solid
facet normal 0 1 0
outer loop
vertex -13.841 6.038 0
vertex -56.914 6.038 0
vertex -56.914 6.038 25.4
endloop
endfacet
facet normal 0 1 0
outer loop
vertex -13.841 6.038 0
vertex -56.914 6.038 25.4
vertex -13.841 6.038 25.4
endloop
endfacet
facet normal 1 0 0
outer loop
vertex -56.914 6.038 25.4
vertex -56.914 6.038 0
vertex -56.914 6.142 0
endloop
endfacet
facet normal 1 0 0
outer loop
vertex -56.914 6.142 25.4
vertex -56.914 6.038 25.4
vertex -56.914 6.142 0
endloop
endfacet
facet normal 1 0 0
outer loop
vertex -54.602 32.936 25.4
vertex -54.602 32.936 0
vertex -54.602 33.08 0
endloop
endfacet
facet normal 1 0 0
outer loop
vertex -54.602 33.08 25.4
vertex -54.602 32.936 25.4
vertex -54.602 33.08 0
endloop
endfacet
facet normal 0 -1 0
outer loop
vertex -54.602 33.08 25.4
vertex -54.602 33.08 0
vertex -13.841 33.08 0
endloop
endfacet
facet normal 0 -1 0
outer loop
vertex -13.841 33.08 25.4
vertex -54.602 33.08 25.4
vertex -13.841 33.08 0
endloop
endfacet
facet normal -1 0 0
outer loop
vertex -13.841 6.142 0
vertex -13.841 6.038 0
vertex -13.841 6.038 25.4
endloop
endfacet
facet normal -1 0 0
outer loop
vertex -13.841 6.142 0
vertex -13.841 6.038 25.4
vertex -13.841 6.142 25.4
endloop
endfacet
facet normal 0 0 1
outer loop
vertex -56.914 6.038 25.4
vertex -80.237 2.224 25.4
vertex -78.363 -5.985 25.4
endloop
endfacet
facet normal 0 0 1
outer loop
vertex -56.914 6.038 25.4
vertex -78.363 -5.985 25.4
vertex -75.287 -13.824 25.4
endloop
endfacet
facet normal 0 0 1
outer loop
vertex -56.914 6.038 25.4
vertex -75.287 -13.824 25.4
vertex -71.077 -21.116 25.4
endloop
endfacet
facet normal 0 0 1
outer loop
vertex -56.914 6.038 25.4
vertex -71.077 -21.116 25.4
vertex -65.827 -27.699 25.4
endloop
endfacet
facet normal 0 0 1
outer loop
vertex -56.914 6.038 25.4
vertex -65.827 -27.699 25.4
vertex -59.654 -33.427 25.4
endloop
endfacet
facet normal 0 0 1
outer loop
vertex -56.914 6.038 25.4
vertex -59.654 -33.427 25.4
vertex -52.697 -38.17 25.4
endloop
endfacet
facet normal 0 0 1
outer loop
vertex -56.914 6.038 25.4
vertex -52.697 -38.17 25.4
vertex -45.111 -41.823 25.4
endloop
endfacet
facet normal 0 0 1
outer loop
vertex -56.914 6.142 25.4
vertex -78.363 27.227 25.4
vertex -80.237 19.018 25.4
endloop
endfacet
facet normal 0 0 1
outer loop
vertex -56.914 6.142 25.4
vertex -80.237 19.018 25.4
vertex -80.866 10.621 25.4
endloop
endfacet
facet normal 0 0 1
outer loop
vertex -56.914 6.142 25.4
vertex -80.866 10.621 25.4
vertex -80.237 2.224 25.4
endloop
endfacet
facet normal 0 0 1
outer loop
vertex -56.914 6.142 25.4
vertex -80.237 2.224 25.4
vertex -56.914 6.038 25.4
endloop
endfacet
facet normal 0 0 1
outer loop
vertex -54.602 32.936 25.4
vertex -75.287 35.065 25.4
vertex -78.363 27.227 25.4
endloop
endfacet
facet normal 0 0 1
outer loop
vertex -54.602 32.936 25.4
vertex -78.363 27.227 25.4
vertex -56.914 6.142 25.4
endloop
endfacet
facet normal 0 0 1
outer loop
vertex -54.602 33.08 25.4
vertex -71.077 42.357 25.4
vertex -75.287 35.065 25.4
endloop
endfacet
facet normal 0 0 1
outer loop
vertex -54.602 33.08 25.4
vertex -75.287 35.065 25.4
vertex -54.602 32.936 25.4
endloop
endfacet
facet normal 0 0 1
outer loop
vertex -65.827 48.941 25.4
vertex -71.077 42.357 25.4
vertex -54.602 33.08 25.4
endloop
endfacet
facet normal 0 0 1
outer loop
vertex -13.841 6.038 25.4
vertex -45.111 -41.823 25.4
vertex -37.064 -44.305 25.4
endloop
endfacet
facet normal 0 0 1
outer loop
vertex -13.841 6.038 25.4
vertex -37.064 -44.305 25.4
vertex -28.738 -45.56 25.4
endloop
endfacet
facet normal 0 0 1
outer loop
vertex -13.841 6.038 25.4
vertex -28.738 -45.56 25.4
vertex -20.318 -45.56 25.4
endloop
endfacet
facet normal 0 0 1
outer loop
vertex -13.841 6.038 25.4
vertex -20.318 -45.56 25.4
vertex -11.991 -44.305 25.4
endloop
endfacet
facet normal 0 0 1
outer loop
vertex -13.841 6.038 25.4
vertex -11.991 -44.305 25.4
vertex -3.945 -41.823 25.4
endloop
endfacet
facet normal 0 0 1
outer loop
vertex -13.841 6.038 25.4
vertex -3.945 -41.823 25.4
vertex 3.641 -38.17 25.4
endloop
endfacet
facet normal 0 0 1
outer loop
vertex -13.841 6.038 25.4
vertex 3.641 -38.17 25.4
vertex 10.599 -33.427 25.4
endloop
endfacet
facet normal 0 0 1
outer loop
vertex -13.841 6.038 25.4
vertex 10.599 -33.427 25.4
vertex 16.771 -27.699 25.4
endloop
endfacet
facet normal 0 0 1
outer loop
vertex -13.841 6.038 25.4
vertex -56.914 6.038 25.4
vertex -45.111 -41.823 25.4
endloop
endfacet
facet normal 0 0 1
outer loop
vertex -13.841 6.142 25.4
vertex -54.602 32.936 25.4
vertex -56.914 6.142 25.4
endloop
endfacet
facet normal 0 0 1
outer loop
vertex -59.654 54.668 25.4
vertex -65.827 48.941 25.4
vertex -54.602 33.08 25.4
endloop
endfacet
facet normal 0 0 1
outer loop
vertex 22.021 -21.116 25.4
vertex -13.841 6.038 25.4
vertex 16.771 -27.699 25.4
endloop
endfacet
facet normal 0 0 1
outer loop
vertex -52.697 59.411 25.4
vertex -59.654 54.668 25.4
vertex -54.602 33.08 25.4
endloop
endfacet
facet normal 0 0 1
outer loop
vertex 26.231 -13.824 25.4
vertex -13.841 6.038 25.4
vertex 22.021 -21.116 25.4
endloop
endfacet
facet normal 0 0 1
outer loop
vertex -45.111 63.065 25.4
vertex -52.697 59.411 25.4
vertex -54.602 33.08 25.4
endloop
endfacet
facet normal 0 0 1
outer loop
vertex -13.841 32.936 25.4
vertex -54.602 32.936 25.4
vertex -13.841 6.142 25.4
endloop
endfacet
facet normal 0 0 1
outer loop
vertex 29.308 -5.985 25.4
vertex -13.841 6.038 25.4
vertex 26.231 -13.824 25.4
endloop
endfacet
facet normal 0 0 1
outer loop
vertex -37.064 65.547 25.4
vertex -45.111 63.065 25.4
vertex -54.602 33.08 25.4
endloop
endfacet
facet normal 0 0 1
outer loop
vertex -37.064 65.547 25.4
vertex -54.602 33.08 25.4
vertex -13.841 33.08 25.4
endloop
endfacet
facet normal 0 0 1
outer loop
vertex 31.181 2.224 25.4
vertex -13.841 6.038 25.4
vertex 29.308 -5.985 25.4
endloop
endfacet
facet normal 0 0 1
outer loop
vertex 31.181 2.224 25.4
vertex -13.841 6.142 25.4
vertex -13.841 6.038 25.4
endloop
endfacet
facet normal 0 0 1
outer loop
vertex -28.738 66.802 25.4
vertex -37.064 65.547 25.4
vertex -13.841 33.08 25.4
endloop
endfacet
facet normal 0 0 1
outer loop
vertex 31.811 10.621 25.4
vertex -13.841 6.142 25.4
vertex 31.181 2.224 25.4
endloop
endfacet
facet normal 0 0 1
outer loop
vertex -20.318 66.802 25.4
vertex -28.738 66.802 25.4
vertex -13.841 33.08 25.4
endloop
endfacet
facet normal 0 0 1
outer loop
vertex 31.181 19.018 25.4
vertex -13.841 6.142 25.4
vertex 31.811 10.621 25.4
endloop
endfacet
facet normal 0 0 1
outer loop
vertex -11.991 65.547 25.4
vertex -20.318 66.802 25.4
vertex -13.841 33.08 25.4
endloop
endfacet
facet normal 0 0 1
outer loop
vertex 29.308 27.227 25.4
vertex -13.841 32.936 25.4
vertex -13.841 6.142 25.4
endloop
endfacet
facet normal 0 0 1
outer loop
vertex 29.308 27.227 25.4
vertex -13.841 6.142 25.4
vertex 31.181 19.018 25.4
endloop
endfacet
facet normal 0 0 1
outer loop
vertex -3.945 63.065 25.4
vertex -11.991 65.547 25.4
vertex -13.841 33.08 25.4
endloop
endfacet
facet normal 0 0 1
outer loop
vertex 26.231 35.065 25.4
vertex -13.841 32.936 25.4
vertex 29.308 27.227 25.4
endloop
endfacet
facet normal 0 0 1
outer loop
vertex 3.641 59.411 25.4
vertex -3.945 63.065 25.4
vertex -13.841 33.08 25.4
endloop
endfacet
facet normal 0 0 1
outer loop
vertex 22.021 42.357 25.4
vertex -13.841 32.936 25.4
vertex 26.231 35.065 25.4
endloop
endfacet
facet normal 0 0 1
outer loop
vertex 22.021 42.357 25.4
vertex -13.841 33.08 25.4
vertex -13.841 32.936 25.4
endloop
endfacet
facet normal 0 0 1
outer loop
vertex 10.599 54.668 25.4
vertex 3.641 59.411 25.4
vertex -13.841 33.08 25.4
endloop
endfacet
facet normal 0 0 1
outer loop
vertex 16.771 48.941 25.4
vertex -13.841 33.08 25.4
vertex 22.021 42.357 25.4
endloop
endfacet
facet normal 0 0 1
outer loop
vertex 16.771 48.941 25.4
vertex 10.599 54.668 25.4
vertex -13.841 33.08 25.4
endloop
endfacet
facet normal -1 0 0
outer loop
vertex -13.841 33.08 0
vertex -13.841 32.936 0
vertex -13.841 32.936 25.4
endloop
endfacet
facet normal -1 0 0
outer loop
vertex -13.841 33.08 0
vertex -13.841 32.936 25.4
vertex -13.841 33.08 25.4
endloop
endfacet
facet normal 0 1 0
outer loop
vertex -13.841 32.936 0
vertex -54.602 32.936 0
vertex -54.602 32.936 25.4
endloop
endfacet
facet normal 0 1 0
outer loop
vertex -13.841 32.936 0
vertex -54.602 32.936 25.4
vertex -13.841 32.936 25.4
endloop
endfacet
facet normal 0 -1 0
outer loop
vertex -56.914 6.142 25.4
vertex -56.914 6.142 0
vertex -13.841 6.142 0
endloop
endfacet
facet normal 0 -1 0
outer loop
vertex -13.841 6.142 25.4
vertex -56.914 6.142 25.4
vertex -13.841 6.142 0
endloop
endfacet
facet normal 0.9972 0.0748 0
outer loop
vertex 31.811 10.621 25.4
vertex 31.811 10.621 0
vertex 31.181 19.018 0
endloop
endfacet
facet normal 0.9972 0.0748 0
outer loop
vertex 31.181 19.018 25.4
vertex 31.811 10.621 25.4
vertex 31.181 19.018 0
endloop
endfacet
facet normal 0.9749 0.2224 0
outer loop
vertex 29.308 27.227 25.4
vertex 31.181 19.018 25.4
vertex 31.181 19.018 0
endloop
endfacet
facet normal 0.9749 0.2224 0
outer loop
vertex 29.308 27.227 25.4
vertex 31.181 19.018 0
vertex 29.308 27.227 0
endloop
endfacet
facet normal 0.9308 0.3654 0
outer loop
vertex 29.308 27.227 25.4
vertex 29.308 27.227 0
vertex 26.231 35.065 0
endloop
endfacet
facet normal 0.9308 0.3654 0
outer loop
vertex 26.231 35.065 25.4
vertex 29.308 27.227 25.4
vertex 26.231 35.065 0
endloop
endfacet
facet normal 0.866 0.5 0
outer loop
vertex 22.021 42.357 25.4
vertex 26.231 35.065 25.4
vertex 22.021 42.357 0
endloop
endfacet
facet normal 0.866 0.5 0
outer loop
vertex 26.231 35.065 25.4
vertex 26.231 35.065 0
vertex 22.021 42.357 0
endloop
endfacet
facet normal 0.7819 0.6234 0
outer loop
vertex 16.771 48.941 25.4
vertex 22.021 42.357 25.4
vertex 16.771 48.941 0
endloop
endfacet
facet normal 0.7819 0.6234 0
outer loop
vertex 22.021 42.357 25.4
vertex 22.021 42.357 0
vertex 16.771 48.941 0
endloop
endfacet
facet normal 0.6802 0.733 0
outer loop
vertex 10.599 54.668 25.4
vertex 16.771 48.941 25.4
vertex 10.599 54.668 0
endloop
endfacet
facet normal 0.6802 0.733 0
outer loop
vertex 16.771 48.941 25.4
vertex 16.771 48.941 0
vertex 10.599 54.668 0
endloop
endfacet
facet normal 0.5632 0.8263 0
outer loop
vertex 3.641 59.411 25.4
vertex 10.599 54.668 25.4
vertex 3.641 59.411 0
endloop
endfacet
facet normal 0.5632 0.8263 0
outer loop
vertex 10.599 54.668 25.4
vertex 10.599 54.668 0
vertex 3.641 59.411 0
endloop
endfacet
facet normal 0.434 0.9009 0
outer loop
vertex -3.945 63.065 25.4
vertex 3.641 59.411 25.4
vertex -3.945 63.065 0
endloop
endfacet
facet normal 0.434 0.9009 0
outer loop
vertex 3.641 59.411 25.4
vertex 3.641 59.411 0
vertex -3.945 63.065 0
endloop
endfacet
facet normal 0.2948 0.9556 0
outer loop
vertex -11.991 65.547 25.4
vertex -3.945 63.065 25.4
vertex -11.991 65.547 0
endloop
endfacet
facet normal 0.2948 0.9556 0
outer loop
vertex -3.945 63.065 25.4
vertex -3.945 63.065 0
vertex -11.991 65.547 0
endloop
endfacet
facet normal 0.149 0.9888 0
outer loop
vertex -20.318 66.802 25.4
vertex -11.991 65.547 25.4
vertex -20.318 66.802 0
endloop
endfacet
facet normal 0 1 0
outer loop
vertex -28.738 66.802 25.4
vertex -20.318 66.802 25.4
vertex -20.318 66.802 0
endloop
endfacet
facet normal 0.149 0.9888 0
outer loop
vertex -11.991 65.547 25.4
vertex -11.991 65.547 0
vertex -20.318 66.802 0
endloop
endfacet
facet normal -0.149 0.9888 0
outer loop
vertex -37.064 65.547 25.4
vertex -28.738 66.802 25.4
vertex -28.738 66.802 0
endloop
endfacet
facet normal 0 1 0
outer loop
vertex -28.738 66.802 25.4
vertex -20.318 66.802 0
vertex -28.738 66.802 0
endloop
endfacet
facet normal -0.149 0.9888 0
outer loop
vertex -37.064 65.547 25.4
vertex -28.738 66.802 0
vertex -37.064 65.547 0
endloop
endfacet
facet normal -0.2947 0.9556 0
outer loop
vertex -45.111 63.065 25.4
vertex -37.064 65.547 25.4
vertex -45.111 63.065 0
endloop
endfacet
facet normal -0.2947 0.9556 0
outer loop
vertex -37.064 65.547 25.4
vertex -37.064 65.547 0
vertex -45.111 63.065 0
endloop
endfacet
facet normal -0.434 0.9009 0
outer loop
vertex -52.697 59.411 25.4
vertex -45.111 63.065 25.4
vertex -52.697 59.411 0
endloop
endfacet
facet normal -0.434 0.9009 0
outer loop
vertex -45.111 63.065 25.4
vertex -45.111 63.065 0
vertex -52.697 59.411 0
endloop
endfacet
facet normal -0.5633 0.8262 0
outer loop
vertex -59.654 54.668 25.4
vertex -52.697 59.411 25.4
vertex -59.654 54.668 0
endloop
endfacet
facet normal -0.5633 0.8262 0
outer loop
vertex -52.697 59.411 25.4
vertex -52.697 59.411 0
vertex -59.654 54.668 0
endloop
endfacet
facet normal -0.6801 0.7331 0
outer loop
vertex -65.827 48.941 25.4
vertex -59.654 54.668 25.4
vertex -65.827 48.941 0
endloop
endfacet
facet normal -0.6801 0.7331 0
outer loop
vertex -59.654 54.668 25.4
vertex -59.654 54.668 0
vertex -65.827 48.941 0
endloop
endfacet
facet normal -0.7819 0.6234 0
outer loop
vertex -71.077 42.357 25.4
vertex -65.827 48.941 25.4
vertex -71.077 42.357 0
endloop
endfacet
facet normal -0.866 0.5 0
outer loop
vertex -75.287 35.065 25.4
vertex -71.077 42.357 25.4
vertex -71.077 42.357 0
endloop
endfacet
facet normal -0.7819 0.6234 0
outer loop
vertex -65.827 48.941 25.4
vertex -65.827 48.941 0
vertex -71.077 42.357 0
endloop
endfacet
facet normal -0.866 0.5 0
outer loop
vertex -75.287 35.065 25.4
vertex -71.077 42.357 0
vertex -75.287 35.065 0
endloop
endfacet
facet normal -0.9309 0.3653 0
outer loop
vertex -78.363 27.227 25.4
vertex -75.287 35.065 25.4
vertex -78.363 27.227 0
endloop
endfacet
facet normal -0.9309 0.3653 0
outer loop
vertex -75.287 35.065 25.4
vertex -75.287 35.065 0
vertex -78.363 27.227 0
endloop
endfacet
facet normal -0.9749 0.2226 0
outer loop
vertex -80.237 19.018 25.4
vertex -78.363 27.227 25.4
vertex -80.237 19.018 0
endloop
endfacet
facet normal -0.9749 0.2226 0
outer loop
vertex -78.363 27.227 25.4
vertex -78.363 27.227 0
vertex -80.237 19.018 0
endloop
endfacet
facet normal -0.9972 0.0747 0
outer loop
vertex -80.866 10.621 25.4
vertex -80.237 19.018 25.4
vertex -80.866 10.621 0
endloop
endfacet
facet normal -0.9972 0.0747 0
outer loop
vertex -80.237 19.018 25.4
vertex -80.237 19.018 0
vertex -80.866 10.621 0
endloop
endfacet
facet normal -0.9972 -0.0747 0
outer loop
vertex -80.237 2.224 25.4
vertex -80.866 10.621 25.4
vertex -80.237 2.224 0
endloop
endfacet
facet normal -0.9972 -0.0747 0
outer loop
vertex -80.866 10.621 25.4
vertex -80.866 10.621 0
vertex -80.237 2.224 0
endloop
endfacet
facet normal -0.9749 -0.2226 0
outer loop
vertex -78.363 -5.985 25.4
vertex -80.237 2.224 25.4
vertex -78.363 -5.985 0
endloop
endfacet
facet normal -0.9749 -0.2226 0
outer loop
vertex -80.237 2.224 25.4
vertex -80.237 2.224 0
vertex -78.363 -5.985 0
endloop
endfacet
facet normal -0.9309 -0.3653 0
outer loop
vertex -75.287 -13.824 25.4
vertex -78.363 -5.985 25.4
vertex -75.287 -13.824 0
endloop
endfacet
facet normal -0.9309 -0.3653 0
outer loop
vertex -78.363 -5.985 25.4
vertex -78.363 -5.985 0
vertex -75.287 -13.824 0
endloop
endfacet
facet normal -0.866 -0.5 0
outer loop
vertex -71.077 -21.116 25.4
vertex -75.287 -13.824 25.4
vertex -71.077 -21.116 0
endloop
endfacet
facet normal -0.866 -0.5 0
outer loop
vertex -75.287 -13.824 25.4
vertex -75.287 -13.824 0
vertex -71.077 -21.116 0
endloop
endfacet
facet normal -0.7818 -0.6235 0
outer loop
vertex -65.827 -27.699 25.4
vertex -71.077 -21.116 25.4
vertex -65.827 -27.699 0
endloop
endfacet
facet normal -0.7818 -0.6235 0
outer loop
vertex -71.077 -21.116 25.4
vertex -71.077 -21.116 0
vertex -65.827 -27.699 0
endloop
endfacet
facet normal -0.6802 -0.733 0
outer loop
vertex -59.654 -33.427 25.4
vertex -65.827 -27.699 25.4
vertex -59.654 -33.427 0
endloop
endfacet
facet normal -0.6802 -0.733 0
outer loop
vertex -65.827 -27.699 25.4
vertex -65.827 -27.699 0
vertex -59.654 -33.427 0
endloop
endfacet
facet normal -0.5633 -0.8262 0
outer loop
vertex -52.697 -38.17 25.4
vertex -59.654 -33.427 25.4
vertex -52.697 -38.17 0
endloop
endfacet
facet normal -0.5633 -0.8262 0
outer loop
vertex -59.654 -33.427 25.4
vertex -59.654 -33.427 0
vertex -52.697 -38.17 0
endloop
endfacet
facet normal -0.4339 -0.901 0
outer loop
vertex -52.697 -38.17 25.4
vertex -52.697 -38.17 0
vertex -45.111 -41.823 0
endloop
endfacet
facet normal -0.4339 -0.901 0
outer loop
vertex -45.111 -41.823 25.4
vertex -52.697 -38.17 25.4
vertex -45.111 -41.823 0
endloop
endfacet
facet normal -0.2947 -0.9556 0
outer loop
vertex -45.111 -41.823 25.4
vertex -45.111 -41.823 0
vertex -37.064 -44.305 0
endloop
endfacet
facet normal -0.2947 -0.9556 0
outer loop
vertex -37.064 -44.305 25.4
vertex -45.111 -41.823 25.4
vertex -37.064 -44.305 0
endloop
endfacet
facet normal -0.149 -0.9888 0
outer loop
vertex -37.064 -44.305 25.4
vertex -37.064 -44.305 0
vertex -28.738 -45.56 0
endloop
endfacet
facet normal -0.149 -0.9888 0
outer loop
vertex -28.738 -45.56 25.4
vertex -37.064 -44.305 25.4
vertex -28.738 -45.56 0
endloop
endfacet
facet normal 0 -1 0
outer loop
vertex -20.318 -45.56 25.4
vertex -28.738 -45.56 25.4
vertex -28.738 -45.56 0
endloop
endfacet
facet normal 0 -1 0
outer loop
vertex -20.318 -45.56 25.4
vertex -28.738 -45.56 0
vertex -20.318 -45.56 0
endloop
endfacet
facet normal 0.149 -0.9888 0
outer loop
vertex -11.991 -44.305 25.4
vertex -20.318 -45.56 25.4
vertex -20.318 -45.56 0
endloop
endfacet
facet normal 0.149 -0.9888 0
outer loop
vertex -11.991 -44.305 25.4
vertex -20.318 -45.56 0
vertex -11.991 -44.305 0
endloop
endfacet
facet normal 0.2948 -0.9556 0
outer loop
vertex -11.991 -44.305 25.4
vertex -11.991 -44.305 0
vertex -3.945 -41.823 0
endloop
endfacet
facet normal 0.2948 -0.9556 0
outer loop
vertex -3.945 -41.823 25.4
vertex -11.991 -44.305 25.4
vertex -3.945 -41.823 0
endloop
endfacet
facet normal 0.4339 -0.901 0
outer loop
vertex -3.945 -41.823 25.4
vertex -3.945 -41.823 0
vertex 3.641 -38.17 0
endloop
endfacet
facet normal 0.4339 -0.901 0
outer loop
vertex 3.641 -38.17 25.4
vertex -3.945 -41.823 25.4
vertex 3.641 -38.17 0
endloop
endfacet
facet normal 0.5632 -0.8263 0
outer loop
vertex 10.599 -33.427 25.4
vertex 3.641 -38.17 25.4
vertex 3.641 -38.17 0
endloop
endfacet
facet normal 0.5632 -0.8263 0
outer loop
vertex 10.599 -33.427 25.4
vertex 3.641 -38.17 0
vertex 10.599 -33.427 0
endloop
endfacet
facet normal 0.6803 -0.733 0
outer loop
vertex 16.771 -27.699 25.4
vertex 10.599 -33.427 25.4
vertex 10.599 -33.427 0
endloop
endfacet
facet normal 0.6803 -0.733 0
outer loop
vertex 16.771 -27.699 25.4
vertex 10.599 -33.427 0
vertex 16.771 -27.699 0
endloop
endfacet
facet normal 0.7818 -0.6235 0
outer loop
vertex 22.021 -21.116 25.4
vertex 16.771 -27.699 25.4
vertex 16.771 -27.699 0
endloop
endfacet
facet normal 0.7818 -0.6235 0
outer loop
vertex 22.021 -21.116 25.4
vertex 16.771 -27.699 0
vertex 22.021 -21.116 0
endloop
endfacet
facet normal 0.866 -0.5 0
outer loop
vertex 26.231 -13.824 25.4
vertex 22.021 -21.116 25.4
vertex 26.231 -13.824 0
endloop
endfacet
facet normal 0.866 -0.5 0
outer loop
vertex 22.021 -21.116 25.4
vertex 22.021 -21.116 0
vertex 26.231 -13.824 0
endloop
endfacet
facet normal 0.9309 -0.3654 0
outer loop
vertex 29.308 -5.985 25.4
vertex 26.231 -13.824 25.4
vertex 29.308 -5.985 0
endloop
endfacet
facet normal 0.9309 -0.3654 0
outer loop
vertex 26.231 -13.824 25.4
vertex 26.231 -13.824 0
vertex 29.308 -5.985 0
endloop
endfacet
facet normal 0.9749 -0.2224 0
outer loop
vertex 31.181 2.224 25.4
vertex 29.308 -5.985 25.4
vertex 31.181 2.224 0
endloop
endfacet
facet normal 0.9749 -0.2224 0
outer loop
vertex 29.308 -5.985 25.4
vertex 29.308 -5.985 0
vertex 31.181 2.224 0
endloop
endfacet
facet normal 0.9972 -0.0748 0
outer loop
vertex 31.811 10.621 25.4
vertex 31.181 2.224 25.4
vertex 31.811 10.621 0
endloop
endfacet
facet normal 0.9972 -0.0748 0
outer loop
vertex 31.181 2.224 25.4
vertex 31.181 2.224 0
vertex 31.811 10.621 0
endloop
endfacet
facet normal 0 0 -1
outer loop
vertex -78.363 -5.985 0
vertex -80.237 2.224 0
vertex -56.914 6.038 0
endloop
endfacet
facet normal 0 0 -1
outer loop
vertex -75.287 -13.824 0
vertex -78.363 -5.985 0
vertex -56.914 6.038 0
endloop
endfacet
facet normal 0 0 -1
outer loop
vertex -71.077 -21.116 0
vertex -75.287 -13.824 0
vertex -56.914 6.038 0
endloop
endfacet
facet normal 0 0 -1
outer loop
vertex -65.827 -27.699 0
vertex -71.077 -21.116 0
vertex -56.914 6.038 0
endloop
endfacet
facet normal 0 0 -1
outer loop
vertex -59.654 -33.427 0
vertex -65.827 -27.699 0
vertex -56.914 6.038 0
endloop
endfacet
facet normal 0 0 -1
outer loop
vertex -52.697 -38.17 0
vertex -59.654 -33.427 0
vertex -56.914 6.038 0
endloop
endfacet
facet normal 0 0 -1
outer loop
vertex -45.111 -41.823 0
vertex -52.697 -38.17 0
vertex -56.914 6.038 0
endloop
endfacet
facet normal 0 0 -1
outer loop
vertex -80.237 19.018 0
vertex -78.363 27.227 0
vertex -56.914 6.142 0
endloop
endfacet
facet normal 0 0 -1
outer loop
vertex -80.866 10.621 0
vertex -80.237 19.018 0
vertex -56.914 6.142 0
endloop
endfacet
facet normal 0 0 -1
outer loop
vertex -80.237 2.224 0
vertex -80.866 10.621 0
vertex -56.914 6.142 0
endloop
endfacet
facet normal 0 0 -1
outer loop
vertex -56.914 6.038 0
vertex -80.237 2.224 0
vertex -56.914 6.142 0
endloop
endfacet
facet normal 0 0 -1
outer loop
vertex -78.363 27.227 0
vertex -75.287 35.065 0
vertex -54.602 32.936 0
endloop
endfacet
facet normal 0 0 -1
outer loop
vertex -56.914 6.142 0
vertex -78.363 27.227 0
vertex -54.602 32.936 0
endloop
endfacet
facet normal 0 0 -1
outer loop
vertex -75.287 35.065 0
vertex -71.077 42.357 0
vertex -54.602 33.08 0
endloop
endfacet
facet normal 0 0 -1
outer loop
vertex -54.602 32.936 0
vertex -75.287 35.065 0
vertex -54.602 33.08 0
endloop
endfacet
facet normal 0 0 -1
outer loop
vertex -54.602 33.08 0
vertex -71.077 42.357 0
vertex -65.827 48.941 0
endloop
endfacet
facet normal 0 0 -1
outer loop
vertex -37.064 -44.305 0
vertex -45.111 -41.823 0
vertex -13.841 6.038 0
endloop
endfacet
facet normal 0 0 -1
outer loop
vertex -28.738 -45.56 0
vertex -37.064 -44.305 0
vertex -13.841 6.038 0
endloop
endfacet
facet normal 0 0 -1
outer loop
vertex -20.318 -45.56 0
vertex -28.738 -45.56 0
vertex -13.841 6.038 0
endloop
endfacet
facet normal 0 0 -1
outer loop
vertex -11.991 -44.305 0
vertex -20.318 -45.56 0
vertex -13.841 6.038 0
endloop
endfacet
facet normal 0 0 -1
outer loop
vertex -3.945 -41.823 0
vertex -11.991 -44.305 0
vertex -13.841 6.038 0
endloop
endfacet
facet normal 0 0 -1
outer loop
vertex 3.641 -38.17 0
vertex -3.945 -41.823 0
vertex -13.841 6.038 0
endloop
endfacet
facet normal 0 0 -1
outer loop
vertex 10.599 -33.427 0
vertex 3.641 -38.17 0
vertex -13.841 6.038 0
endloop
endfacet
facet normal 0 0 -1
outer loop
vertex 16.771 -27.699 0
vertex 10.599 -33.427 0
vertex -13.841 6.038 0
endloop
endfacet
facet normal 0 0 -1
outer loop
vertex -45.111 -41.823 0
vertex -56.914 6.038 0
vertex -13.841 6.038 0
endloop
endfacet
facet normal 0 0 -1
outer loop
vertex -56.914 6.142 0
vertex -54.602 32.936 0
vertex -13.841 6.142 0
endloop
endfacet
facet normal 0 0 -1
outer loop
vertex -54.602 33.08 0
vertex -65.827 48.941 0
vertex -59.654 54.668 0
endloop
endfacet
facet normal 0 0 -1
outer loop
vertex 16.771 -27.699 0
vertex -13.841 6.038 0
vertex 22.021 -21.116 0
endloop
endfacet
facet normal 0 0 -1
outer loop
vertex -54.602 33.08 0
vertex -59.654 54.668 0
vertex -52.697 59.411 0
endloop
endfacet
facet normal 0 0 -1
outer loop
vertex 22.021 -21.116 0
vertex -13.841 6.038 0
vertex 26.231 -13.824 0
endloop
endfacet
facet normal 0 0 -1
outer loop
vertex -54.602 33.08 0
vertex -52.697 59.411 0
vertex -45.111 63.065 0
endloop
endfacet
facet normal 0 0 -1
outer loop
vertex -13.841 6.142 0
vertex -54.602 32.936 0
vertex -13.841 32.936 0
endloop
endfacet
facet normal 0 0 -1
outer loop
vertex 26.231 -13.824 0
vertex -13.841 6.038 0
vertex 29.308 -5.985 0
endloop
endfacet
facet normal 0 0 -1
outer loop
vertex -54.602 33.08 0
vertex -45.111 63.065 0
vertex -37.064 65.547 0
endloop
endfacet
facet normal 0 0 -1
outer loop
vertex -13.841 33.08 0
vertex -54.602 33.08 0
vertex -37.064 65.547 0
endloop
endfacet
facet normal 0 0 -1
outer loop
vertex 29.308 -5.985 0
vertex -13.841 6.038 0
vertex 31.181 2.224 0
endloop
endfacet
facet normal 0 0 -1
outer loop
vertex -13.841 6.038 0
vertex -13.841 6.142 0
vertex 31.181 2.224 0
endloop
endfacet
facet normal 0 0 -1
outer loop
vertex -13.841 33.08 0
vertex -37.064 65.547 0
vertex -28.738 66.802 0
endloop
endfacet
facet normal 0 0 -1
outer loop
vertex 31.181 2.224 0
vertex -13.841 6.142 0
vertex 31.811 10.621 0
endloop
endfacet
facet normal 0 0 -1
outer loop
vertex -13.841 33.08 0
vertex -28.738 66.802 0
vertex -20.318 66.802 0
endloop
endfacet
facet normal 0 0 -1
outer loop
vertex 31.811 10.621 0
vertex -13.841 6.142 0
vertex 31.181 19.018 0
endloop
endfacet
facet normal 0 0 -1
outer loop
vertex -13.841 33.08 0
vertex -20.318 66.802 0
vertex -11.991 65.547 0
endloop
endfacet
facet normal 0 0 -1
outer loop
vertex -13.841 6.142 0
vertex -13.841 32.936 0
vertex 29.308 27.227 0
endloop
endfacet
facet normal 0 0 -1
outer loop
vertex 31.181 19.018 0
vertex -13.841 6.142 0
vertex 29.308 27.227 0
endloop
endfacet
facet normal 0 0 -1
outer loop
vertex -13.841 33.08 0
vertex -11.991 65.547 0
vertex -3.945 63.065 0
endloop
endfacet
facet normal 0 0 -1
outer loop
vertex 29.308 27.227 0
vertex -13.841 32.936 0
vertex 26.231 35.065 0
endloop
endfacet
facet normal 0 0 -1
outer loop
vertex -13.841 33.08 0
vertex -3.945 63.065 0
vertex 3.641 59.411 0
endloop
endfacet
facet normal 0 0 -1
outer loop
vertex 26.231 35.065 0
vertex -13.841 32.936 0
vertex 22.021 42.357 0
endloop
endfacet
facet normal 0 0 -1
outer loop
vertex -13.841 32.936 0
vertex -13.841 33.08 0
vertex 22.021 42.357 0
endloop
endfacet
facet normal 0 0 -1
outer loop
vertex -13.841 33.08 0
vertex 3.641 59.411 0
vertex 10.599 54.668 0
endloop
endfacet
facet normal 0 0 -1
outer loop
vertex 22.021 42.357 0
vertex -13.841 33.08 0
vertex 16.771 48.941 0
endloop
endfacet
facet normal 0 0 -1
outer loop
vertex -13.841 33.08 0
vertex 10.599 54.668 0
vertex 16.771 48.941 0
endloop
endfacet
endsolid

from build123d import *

# Parameters (mm, degrees)
F0_R     = 56.338537
F0_W     = 43.072939
F0_H     = 0.103983
F0_W_2   = 40.760524
F0_H_2   = 0.144385
F1_DEPTH = 25.4


with BuildPart() as f1:
    # F0 (on Top) → F1 (new body)
    with BuildSketch(Plane.XY):
        with Locations((-24.527786, 10.620722)):
            Circle(F0_R)
        with Locations((-35.37745, 6.090215)):
            Rectangle(F0_W, F0_H, mode=Mode.SUBTRACT)
        with Locations((-34.221243, 33.007942)):
            Rectangle(F0_W_2, F0_H_2, mode=Mode.SUBTRACT)
    extrude(amount=F1_DEPTH)


solid = f1.part
